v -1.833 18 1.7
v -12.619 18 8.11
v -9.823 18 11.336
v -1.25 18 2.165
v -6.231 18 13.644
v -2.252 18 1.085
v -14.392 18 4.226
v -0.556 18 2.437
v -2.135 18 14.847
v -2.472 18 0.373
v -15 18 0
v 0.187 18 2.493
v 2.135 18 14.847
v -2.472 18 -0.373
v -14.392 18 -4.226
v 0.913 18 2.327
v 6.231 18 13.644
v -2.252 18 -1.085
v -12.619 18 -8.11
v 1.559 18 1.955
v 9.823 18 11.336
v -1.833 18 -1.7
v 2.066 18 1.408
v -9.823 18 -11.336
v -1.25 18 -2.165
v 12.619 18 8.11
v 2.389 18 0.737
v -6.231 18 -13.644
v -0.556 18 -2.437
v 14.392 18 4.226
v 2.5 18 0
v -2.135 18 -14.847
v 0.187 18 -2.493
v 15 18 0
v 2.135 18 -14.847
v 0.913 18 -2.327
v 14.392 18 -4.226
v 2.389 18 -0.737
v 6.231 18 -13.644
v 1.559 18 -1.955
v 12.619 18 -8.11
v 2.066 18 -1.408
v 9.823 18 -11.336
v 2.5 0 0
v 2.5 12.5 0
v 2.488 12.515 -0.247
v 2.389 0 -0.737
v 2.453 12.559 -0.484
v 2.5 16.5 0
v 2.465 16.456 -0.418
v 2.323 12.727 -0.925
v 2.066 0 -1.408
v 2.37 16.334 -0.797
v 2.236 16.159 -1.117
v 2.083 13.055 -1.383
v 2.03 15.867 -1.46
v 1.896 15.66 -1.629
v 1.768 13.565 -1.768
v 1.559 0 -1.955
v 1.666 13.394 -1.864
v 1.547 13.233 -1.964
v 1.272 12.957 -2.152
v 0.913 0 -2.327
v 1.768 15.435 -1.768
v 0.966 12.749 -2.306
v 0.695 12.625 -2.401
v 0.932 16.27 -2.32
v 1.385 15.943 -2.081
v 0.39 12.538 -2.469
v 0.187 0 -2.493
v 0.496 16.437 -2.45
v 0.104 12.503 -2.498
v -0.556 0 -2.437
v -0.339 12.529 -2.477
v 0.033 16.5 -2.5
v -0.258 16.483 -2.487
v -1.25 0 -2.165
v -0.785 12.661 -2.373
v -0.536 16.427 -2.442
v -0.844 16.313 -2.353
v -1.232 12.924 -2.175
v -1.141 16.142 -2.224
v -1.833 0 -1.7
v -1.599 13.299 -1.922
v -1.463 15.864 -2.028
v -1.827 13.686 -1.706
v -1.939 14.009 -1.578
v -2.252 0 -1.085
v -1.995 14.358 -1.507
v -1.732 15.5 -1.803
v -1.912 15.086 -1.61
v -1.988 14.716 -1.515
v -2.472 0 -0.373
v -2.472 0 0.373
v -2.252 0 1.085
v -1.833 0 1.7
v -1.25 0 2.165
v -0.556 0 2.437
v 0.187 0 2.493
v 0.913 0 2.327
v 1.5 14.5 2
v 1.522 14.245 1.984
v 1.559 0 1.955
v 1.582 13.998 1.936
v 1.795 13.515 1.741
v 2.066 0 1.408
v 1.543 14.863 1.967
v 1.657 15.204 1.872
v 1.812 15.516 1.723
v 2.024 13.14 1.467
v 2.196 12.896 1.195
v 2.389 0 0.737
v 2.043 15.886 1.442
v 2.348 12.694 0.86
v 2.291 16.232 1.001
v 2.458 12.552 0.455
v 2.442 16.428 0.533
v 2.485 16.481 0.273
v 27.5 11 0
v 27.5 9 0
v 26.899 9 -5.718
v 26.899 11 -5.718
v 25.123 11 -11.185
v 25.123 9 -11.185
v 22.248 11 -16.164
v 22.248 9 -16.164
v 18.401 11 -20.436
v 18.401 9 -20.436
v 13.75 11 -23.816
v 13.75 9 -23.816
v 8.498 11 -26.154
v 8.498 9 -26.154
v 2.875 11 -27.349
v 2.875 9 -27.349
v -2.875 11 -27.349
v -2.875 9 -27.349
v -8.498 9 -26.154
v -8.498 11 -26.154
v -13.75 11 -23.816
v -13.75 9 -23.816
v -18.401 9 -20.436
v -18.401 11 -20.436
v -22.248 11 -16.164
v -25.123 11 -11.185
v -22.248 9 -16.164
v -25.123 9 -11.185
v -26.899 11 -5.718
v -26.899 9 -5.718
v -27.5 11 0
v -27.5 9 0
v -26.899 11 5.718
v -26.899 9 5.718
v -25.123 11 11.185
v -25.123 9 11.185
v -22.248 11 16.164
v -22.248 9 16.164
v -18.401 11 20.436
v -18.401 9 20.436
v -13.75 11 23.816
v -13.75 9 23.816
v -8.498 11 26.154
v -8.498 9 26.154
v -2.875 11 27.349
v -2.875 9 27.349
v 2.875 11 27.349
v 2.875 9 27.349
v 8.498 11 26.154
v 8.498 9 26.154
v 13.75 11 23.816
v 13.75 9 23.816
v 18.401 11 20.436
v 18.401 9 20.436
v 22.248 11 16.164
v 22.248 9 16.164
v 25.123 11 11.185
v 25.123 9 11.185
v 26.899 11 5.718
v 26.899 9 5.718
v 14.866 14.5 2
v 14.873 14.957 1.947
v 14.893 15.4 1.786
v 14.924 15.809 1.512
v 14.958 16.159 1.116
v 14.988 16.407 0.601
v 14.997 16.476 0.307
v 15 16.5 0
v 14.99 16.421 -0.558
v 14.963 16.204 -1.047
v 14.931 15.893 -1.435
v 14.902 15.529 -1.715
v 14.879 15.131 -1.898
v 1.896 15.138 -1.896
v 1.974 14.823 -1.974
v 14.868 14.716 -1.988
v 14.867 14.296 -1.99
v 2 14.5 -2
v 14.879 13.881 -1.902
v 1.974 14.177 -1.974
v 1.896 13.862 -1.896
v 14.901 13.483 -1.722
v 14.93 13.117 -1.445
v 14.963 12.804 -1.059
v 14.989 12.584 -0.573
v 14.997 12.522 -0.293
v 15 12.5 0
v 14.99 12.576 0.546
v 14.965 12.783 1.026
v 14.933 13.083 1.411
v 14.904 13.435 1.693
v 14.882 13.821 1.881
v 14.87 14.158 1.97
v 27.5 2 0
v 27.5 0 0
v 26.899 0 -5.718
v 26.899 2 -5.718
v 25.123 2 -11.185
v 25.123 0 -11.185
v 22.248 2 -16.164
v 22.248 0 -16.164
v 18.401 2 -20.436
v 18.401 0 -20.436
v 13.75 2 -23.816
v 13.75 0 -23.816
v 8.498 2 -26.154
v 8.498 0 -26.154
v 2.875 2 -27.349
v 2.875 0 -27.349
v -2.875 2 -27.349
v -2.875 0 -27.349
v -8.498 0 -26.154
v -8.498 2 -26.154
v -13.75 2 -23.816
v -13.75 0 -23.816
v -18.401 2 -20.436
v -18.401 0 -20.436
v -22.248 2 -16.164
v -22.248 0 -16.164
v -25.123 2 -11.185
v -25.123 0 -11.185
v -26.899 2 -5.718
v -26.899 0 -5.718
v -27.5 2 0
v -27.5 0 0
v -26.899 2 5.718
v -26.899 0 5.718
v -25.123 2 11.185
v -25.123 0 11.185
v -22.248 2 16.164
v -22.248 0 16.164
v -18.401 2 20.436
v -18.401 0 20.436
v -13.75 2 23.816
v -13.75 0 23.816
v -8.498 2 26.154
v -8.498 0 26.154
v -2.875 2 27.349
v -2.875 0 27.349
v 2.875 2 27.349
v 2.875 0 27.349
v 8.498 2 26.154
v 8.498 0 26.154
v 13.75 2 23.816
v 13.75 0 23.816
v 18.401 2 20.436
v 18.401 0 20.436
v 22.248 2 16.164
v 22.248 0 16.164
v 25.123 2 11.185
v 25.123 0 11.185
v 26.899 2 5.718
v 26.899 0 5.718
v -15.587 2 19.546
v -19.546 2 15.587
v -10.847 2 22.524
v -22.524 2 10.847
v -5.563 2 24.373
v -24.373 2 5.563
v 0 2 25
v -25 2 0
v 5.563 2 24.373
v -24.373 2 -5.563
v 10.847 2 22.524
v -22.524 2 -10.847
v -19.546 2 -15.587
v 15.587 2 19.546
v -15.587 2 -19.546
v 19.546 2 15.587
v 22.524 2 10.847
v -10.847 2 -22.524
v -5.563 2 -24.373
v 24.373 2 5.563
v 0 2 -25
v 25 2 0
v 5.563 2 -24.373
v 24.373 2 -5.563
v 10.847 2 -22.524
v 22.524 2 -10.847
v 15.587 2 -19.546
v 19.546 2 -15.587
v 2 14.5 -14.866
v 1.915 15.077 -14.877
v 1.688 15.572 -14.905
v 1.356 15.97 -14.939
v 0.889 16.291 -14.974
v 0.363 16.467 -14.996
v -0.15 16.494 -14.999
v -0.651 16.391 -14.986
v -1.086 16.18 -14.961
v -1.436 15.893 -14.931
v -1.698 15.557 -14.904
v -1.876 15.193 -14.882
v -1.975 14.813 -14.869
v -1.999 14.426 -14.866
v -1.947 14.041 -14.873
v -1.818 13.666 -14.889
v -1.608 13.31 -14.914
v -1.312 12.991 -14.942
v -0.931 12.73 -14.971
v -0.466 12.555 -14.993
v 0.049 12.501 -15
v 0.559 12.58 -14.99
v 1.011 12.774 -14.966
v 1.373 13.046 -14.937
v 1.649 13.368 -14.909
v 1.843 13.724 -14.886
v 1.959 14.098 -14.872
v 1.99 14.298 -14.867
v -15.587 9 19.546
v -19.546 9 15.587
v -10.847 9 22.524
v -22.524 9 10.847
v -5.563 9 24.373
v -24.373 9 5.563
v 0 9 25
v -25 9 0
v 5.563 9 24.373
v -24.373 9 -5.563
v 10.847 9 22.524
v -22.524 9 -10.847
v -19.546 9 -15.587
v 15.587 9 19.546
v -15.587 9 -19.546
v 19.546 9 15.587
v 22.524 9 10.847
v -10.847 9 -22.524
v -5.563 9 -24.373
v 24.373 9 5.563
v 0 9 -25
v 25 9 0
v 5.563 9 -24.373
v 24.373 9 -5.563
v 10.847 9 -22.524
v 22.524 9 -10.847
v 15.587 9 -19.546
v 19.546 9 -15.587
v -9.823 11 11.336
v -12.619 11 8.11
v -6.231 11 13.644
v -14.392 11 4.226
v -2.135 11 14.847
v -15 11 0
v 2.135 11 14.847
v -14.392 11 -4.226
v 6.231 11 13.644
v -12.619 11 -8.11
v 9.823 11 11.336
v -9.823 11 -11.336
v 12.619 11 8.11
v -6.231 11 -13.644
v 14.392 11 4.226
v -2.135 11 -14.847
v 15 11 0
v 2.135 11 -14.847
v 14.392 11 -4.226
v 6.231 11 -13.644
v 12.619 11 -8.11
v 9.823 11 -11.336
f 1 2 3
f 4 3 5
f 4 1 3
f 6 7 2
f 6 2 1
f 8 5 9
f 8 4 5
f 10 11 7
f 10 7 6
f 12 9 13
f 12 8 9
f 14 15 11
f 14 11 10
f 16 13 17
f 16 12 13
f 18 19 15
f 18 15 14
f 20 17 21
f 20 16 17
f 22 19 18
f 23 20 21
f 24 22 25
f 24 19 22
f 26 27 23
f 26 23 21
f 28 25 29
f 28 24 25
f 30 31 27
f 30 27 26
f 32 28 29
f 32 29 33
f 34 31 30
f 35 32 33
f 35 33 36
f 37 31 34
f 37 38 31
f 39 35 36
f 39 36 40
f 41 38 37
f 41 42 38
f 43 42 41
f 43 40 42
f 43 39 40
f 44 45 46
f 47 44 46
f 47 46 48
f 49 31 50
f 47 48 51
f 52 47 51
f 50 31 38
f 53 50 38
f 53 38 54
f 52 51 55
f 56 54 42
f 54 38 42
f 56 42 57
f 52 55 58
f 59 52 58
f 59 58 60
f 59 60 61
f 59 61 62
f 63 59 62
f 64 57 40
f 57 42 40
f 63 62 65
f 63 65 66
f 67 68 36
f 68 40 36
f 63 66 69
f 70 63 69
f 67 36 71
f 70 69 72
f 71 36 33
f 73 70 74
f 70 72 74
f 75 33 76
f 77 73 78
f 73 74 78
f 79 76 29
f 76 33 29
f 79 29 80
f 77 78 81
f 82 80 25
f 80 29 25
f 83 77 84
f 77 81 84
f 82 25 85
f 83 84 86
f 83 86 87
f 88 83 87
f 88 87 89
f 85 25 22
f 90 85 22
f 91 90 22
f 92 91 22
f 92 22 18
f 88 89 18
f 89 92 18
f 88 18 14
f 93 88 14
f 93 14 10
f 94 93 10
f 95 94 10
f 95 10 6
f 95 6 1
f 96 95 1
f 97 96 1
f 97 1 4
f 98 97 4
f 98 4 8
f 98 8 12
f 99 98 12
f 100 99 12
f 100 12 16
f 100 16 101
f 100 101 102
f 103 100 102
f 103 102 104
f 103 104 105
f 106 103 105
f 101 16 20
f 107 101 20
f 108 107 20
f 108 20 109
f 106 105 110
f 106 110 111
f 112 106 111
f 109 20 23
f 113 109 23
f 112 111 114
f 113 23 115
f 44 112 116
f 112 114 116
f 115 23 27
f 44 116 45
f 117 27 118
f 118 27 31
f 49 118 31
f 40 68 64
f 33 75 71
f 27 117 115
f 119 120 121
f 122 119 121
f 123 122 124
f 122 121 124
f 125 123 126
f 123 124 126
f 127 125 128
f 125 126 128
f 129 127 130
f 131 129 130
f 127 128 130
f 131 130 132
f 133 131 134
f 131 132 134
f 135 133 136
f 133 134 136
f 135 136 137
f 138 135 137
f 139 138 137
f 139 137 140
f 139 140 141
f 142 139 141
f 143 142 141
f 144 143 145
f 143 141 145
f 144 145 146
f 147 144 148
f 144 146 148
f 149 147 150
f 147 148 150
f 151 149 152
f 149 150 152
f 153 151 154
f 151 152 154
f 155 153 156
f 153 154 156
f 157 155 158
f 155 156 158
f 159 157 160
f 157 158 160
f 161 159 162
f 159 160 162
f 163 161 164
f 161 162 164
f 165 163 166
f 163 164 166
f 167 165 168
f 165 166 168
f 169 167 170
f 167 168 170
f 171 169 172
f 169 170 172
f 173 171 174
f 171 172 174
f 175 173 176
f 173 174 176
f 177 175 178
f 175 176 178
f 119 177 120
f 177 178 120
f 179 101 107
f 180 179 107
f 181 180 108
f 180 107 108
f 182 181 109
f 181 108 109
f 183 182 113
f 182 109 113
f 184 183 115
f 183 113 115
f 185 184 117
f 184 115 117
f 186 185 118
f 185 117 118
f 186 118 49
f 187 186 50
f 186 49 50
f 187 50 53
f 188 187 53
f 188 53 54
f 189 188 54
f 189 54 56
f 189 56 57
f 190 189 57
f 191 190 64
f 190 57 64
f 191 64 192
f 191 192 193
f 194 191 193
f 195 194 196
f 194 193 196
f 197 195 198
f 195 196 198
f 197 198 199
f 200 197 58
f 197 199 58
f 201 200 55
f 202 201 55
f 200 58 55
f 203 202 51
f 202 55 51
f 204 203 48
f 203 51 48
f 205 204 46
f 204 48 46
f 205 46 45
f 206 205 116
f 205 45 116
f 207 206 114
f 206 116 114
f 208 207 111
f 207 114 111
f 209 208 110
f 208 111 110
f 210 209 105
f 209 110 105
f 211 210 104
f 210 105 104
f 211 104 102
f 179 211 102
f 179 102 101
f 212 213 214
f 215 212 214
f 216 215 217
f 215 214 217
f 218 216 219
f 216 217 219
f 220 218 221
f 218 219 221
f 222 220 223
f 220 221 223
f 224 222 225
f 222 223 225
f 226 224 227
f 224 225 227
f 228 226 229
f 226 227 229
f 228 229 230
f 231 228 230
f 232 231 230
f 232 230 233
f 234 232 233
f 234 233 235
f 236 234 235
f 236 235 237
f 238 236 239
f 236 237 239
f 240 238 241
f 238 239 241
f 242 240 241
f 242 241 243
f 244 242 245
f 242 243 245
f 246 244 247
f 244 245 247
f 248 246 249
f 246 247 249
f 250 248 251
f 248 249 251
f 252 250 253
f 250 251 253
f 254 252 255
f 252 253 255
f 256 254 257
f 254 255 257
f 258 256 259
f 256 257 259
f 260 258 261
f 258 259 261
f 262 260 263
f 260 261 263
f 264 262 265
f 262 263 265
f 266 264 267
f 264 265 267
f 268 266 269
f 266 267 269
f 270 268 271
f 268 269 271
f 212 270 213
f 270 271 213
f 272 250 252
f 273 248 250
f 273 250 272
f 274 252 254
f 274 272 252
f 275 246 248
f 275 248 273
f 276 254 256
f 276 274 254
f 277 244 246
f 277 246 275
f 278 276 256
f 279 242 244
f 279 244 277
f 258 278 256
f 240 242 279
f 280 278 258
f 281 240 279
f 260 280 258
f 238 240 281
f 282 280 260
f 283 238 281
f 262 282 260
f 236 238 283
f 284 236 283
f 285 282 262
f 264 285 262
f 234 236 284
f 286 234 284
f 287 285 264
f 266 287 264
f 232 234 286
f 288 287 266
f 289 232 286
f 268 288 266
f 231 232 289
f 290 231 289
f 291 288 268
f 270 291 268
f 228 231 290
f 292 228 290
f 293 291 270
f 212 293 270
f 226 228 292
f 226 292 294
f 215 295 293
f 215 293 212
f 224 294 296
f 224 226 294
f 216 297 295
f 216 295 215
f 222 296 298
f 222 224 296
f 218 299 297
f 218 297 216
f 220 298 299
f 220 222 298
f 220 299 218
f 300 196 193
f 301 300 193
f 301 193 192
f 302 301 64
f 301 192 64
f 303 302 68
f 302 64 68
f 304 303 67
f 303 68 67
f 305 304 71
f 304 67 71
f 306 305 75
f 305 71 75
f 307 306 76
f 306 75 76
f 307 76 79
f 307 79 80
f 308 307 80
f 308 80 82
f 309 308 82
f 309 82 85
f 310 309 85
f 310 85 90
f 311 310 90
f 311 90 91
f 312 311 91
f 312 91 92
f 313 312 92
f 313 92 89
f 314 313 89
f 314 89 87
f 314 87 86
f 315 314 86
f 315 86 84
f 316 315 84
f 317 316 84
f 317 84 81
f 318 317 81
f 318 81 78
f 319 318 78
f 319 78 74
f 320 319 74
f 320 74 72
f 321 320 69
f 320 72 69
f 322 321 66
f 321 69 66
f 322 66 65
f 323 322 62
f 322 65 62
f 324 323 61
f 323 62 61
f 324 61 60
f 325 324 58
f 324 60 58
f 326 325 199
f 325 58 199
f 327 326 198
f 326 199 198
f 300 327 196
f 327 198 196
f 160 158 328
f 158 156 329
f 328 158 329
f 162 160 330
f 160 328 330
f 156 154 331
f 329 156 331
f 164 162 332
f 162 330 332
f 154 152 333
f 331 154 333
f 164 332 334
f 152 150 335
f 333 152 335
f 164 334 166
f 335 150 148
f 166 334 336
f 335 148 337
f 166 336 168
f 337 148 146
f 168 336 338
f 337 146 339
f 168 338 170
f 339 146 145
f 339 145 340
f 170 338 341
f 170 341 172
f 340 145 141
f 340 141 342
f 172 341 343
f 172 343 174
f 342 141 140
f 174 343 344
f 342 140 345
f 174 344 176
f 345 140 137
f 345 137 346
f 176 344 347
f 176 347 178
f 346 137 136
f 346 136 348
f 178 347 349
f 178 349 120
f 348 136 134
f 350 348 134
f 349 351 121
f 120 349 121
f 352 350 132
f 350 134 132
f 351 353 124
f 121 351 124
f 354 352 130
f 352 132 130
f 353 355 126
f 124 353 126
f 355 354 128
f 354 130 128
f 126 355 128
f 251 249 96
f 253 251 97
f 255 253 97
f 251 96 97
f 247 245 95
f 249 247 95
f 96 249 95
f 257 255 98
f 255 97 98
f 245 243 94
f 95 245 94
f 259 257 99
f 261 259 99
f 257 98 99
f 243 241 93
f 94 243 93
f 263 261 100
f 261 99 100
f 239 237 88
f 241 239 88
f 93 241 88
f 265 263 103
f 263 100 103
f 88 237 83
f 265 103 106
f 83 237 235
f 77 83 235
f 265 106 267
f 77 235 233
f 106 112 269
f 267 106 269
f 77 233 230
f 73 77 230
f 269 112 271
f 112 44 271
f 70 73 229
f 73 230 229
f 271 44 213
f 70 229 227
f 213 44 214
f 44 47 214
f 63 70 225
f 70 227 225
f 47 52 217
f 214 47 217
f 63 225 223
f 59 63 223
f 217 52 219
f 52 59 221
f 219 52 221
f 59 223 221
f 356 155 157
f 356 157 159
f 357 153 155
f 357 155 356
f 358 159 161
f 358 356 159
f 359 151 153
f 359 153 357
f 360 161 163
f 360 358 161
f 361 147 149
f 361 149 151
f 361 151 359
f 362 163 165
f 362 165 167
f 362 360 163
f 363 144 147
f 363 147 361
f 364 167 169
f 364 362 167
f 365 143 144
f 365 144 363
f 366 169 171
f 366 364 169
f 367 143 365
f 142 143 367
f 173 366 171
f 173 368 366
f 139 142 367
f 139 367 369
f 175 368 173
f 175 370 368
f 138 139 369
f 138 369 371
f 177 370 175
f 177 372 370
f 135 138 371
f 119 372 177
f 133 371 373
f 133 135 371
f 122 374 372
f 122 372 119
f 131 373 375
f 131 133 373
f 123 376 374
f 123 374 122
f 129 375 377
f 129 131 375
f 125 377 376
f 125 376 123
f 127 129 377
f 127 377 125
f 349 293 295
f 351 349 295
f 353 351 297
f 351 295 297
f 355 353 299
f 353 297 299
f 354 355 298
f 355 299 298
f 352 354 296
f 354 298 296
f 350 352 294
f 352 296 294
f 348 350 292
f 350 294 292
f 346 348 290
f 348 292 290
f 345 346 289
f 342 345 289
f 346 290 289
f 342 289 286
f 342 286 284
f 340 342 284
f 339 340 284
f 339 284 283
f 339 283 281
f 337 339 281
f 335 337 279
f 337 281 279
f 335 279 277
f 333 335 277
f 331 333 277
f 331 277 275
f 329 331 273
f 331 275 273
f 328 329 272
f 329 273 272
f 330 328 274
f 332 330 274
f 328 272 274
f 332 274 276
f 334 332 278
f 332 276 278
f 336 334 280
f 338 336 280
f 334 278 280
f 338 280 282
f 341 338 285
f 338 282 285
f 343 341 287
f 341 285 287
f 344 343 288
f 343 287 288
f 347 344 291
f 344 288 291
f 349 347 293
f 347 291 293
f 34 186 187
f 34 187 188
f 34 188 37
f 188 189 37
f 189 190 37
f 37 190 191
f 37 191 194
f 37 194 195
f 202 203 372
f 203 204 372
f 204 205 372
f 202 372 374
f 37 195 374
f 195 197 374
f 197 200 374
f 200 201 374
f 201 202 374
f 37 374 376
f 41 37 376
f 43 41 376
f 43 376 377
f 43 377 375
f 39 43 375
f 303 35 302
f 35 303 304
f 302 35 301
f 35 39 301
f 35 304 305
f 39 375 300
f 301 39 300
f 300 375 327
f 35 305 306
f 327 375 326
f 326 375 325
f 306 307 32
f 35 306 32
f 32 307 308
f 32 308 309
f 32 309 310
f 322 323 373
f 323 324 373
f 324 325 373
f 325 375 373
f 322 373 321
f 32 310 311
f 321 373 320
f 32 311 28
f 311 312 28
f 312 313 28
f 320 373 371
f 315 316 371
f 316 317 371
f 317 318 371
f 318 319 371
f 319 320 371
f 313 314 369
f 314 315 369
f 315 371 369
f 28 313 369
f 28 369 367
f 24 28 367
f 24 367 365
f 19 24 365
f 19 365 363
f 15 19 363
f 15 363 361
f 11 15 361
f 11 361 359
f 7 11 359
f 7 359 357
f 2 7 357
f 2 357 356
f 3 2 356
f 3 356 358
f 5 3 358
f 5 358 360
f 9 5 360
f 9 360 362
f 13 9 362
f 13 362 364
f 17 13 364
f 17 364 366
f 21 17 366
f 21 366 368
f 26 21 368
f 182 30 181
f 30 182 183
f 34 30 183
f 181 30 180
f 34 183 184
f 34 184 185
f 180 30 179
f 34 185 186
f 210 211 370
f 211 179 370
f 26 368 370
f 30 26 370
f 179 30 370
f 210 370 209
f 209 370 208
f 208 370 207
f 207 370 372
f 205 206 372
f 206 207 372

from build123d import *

# Parameters (mm, degrees)
SKETCH1_R           = 27.5
BOSS_EXTRUDE1_DEPTH = 2
SKETCH2_R           = 25
BOSS_EXTRUDE2_DEPTH = 7
SKETCH3_R           = 27.5
BOSS_EXTRUDE3_DEPTH = 2
SKETCH4_R           = 15
BOSS_EXTRUDE4_DEPTH = 7
SKETCH5_R           = 2.5
CUT_EXTRUDE1_DEPTH  = 19
SKETCH6_R           = 2
CUT_EXTRUDE2_DEPTH  = 28.5
CIRPATTERN1_COUNT   = 2
CIRPATTERN1_ANGLE   = 90


with BuildPart() as part:
    # Sketch1 → Boss-Extrude1 (new body)
    with BuildSketch(Plane(origin=(0, 0, 0), x_dir=(1, 0, 0), z_dir=(0, 1, 0))):
        Circle(SKETCH1_R)
    extrude(amount=BOSS_EXTRUDE1_DEPTH)

    # Sketch2 → Boss-Extrude2 (add)
    with BuildSketch(Plane(origin=(0, 2, 0), x_dir=(1, 0, 0), z_dir=(0, 1, 0))):
        Circle(SKETCH2_R)
    extrude(amount=BOSS_EXTRUDE2_DEPTH)

    # Sketch3 → Boss-Extrude3 (add)
    with BuildSketch(Plane(origin=(0, 9, 0), x_dir=(1, 0, 0), z_dir=(0, 1, 0))):
        Circle(SKETCH3_R)
    extrude(amount=BOSS_EXTRUDE3_DEPTH)

    # Sketch4 → Boss-Extrude4 (add)
    with BuildSketch(Plane(origin=(0, 11, 0), x_dir=(1, 0, 0), z_dir=(0, 1, 0))):
        Circle(SKETCH4_R)
    extrude(amount=BOSS_EXTRUDE4_DEPTH)

    # Sketch5 → Cut-Extrude1 (cut, through all)
    with BuildSketch(Plane(origin=(0, 18, 0), x_dir=(1, 0, 0), z_dir=(0, 1, 0))):
        Circle(SKETCH5_R)
    extrude(amount=-CUT_EXTRUDE1_DEPTH, mode=Mode.SUBTRACT)

    # Sketch6 → Cut-Extrude2 (cut, through all)
    with BuildSketch(Plane.XY):
        with Locations((0, 14.5)):
            Circle(SKETCH6_R)
    cut_extrude2 = extrude(amount=-CUT_EXTRUDE2_DEPTH, mode=Mode.SUBTRACT)

    # CirPattern1: Cut-Extrude2 ×2 about axis
    cirpattern1_axis = Axis((0, 18, 0), (0, -1, 0))
    for i in range(1, CIRPATTERN1_COUNT):
        add(cut_extrude2.rotate(cirpattern1_axis, i * CIRPATTERN1_ANGLE / (CIRPATTERN1_COUNT - 1)), mode=Mode.SUBTRACT)


solid = part.part
